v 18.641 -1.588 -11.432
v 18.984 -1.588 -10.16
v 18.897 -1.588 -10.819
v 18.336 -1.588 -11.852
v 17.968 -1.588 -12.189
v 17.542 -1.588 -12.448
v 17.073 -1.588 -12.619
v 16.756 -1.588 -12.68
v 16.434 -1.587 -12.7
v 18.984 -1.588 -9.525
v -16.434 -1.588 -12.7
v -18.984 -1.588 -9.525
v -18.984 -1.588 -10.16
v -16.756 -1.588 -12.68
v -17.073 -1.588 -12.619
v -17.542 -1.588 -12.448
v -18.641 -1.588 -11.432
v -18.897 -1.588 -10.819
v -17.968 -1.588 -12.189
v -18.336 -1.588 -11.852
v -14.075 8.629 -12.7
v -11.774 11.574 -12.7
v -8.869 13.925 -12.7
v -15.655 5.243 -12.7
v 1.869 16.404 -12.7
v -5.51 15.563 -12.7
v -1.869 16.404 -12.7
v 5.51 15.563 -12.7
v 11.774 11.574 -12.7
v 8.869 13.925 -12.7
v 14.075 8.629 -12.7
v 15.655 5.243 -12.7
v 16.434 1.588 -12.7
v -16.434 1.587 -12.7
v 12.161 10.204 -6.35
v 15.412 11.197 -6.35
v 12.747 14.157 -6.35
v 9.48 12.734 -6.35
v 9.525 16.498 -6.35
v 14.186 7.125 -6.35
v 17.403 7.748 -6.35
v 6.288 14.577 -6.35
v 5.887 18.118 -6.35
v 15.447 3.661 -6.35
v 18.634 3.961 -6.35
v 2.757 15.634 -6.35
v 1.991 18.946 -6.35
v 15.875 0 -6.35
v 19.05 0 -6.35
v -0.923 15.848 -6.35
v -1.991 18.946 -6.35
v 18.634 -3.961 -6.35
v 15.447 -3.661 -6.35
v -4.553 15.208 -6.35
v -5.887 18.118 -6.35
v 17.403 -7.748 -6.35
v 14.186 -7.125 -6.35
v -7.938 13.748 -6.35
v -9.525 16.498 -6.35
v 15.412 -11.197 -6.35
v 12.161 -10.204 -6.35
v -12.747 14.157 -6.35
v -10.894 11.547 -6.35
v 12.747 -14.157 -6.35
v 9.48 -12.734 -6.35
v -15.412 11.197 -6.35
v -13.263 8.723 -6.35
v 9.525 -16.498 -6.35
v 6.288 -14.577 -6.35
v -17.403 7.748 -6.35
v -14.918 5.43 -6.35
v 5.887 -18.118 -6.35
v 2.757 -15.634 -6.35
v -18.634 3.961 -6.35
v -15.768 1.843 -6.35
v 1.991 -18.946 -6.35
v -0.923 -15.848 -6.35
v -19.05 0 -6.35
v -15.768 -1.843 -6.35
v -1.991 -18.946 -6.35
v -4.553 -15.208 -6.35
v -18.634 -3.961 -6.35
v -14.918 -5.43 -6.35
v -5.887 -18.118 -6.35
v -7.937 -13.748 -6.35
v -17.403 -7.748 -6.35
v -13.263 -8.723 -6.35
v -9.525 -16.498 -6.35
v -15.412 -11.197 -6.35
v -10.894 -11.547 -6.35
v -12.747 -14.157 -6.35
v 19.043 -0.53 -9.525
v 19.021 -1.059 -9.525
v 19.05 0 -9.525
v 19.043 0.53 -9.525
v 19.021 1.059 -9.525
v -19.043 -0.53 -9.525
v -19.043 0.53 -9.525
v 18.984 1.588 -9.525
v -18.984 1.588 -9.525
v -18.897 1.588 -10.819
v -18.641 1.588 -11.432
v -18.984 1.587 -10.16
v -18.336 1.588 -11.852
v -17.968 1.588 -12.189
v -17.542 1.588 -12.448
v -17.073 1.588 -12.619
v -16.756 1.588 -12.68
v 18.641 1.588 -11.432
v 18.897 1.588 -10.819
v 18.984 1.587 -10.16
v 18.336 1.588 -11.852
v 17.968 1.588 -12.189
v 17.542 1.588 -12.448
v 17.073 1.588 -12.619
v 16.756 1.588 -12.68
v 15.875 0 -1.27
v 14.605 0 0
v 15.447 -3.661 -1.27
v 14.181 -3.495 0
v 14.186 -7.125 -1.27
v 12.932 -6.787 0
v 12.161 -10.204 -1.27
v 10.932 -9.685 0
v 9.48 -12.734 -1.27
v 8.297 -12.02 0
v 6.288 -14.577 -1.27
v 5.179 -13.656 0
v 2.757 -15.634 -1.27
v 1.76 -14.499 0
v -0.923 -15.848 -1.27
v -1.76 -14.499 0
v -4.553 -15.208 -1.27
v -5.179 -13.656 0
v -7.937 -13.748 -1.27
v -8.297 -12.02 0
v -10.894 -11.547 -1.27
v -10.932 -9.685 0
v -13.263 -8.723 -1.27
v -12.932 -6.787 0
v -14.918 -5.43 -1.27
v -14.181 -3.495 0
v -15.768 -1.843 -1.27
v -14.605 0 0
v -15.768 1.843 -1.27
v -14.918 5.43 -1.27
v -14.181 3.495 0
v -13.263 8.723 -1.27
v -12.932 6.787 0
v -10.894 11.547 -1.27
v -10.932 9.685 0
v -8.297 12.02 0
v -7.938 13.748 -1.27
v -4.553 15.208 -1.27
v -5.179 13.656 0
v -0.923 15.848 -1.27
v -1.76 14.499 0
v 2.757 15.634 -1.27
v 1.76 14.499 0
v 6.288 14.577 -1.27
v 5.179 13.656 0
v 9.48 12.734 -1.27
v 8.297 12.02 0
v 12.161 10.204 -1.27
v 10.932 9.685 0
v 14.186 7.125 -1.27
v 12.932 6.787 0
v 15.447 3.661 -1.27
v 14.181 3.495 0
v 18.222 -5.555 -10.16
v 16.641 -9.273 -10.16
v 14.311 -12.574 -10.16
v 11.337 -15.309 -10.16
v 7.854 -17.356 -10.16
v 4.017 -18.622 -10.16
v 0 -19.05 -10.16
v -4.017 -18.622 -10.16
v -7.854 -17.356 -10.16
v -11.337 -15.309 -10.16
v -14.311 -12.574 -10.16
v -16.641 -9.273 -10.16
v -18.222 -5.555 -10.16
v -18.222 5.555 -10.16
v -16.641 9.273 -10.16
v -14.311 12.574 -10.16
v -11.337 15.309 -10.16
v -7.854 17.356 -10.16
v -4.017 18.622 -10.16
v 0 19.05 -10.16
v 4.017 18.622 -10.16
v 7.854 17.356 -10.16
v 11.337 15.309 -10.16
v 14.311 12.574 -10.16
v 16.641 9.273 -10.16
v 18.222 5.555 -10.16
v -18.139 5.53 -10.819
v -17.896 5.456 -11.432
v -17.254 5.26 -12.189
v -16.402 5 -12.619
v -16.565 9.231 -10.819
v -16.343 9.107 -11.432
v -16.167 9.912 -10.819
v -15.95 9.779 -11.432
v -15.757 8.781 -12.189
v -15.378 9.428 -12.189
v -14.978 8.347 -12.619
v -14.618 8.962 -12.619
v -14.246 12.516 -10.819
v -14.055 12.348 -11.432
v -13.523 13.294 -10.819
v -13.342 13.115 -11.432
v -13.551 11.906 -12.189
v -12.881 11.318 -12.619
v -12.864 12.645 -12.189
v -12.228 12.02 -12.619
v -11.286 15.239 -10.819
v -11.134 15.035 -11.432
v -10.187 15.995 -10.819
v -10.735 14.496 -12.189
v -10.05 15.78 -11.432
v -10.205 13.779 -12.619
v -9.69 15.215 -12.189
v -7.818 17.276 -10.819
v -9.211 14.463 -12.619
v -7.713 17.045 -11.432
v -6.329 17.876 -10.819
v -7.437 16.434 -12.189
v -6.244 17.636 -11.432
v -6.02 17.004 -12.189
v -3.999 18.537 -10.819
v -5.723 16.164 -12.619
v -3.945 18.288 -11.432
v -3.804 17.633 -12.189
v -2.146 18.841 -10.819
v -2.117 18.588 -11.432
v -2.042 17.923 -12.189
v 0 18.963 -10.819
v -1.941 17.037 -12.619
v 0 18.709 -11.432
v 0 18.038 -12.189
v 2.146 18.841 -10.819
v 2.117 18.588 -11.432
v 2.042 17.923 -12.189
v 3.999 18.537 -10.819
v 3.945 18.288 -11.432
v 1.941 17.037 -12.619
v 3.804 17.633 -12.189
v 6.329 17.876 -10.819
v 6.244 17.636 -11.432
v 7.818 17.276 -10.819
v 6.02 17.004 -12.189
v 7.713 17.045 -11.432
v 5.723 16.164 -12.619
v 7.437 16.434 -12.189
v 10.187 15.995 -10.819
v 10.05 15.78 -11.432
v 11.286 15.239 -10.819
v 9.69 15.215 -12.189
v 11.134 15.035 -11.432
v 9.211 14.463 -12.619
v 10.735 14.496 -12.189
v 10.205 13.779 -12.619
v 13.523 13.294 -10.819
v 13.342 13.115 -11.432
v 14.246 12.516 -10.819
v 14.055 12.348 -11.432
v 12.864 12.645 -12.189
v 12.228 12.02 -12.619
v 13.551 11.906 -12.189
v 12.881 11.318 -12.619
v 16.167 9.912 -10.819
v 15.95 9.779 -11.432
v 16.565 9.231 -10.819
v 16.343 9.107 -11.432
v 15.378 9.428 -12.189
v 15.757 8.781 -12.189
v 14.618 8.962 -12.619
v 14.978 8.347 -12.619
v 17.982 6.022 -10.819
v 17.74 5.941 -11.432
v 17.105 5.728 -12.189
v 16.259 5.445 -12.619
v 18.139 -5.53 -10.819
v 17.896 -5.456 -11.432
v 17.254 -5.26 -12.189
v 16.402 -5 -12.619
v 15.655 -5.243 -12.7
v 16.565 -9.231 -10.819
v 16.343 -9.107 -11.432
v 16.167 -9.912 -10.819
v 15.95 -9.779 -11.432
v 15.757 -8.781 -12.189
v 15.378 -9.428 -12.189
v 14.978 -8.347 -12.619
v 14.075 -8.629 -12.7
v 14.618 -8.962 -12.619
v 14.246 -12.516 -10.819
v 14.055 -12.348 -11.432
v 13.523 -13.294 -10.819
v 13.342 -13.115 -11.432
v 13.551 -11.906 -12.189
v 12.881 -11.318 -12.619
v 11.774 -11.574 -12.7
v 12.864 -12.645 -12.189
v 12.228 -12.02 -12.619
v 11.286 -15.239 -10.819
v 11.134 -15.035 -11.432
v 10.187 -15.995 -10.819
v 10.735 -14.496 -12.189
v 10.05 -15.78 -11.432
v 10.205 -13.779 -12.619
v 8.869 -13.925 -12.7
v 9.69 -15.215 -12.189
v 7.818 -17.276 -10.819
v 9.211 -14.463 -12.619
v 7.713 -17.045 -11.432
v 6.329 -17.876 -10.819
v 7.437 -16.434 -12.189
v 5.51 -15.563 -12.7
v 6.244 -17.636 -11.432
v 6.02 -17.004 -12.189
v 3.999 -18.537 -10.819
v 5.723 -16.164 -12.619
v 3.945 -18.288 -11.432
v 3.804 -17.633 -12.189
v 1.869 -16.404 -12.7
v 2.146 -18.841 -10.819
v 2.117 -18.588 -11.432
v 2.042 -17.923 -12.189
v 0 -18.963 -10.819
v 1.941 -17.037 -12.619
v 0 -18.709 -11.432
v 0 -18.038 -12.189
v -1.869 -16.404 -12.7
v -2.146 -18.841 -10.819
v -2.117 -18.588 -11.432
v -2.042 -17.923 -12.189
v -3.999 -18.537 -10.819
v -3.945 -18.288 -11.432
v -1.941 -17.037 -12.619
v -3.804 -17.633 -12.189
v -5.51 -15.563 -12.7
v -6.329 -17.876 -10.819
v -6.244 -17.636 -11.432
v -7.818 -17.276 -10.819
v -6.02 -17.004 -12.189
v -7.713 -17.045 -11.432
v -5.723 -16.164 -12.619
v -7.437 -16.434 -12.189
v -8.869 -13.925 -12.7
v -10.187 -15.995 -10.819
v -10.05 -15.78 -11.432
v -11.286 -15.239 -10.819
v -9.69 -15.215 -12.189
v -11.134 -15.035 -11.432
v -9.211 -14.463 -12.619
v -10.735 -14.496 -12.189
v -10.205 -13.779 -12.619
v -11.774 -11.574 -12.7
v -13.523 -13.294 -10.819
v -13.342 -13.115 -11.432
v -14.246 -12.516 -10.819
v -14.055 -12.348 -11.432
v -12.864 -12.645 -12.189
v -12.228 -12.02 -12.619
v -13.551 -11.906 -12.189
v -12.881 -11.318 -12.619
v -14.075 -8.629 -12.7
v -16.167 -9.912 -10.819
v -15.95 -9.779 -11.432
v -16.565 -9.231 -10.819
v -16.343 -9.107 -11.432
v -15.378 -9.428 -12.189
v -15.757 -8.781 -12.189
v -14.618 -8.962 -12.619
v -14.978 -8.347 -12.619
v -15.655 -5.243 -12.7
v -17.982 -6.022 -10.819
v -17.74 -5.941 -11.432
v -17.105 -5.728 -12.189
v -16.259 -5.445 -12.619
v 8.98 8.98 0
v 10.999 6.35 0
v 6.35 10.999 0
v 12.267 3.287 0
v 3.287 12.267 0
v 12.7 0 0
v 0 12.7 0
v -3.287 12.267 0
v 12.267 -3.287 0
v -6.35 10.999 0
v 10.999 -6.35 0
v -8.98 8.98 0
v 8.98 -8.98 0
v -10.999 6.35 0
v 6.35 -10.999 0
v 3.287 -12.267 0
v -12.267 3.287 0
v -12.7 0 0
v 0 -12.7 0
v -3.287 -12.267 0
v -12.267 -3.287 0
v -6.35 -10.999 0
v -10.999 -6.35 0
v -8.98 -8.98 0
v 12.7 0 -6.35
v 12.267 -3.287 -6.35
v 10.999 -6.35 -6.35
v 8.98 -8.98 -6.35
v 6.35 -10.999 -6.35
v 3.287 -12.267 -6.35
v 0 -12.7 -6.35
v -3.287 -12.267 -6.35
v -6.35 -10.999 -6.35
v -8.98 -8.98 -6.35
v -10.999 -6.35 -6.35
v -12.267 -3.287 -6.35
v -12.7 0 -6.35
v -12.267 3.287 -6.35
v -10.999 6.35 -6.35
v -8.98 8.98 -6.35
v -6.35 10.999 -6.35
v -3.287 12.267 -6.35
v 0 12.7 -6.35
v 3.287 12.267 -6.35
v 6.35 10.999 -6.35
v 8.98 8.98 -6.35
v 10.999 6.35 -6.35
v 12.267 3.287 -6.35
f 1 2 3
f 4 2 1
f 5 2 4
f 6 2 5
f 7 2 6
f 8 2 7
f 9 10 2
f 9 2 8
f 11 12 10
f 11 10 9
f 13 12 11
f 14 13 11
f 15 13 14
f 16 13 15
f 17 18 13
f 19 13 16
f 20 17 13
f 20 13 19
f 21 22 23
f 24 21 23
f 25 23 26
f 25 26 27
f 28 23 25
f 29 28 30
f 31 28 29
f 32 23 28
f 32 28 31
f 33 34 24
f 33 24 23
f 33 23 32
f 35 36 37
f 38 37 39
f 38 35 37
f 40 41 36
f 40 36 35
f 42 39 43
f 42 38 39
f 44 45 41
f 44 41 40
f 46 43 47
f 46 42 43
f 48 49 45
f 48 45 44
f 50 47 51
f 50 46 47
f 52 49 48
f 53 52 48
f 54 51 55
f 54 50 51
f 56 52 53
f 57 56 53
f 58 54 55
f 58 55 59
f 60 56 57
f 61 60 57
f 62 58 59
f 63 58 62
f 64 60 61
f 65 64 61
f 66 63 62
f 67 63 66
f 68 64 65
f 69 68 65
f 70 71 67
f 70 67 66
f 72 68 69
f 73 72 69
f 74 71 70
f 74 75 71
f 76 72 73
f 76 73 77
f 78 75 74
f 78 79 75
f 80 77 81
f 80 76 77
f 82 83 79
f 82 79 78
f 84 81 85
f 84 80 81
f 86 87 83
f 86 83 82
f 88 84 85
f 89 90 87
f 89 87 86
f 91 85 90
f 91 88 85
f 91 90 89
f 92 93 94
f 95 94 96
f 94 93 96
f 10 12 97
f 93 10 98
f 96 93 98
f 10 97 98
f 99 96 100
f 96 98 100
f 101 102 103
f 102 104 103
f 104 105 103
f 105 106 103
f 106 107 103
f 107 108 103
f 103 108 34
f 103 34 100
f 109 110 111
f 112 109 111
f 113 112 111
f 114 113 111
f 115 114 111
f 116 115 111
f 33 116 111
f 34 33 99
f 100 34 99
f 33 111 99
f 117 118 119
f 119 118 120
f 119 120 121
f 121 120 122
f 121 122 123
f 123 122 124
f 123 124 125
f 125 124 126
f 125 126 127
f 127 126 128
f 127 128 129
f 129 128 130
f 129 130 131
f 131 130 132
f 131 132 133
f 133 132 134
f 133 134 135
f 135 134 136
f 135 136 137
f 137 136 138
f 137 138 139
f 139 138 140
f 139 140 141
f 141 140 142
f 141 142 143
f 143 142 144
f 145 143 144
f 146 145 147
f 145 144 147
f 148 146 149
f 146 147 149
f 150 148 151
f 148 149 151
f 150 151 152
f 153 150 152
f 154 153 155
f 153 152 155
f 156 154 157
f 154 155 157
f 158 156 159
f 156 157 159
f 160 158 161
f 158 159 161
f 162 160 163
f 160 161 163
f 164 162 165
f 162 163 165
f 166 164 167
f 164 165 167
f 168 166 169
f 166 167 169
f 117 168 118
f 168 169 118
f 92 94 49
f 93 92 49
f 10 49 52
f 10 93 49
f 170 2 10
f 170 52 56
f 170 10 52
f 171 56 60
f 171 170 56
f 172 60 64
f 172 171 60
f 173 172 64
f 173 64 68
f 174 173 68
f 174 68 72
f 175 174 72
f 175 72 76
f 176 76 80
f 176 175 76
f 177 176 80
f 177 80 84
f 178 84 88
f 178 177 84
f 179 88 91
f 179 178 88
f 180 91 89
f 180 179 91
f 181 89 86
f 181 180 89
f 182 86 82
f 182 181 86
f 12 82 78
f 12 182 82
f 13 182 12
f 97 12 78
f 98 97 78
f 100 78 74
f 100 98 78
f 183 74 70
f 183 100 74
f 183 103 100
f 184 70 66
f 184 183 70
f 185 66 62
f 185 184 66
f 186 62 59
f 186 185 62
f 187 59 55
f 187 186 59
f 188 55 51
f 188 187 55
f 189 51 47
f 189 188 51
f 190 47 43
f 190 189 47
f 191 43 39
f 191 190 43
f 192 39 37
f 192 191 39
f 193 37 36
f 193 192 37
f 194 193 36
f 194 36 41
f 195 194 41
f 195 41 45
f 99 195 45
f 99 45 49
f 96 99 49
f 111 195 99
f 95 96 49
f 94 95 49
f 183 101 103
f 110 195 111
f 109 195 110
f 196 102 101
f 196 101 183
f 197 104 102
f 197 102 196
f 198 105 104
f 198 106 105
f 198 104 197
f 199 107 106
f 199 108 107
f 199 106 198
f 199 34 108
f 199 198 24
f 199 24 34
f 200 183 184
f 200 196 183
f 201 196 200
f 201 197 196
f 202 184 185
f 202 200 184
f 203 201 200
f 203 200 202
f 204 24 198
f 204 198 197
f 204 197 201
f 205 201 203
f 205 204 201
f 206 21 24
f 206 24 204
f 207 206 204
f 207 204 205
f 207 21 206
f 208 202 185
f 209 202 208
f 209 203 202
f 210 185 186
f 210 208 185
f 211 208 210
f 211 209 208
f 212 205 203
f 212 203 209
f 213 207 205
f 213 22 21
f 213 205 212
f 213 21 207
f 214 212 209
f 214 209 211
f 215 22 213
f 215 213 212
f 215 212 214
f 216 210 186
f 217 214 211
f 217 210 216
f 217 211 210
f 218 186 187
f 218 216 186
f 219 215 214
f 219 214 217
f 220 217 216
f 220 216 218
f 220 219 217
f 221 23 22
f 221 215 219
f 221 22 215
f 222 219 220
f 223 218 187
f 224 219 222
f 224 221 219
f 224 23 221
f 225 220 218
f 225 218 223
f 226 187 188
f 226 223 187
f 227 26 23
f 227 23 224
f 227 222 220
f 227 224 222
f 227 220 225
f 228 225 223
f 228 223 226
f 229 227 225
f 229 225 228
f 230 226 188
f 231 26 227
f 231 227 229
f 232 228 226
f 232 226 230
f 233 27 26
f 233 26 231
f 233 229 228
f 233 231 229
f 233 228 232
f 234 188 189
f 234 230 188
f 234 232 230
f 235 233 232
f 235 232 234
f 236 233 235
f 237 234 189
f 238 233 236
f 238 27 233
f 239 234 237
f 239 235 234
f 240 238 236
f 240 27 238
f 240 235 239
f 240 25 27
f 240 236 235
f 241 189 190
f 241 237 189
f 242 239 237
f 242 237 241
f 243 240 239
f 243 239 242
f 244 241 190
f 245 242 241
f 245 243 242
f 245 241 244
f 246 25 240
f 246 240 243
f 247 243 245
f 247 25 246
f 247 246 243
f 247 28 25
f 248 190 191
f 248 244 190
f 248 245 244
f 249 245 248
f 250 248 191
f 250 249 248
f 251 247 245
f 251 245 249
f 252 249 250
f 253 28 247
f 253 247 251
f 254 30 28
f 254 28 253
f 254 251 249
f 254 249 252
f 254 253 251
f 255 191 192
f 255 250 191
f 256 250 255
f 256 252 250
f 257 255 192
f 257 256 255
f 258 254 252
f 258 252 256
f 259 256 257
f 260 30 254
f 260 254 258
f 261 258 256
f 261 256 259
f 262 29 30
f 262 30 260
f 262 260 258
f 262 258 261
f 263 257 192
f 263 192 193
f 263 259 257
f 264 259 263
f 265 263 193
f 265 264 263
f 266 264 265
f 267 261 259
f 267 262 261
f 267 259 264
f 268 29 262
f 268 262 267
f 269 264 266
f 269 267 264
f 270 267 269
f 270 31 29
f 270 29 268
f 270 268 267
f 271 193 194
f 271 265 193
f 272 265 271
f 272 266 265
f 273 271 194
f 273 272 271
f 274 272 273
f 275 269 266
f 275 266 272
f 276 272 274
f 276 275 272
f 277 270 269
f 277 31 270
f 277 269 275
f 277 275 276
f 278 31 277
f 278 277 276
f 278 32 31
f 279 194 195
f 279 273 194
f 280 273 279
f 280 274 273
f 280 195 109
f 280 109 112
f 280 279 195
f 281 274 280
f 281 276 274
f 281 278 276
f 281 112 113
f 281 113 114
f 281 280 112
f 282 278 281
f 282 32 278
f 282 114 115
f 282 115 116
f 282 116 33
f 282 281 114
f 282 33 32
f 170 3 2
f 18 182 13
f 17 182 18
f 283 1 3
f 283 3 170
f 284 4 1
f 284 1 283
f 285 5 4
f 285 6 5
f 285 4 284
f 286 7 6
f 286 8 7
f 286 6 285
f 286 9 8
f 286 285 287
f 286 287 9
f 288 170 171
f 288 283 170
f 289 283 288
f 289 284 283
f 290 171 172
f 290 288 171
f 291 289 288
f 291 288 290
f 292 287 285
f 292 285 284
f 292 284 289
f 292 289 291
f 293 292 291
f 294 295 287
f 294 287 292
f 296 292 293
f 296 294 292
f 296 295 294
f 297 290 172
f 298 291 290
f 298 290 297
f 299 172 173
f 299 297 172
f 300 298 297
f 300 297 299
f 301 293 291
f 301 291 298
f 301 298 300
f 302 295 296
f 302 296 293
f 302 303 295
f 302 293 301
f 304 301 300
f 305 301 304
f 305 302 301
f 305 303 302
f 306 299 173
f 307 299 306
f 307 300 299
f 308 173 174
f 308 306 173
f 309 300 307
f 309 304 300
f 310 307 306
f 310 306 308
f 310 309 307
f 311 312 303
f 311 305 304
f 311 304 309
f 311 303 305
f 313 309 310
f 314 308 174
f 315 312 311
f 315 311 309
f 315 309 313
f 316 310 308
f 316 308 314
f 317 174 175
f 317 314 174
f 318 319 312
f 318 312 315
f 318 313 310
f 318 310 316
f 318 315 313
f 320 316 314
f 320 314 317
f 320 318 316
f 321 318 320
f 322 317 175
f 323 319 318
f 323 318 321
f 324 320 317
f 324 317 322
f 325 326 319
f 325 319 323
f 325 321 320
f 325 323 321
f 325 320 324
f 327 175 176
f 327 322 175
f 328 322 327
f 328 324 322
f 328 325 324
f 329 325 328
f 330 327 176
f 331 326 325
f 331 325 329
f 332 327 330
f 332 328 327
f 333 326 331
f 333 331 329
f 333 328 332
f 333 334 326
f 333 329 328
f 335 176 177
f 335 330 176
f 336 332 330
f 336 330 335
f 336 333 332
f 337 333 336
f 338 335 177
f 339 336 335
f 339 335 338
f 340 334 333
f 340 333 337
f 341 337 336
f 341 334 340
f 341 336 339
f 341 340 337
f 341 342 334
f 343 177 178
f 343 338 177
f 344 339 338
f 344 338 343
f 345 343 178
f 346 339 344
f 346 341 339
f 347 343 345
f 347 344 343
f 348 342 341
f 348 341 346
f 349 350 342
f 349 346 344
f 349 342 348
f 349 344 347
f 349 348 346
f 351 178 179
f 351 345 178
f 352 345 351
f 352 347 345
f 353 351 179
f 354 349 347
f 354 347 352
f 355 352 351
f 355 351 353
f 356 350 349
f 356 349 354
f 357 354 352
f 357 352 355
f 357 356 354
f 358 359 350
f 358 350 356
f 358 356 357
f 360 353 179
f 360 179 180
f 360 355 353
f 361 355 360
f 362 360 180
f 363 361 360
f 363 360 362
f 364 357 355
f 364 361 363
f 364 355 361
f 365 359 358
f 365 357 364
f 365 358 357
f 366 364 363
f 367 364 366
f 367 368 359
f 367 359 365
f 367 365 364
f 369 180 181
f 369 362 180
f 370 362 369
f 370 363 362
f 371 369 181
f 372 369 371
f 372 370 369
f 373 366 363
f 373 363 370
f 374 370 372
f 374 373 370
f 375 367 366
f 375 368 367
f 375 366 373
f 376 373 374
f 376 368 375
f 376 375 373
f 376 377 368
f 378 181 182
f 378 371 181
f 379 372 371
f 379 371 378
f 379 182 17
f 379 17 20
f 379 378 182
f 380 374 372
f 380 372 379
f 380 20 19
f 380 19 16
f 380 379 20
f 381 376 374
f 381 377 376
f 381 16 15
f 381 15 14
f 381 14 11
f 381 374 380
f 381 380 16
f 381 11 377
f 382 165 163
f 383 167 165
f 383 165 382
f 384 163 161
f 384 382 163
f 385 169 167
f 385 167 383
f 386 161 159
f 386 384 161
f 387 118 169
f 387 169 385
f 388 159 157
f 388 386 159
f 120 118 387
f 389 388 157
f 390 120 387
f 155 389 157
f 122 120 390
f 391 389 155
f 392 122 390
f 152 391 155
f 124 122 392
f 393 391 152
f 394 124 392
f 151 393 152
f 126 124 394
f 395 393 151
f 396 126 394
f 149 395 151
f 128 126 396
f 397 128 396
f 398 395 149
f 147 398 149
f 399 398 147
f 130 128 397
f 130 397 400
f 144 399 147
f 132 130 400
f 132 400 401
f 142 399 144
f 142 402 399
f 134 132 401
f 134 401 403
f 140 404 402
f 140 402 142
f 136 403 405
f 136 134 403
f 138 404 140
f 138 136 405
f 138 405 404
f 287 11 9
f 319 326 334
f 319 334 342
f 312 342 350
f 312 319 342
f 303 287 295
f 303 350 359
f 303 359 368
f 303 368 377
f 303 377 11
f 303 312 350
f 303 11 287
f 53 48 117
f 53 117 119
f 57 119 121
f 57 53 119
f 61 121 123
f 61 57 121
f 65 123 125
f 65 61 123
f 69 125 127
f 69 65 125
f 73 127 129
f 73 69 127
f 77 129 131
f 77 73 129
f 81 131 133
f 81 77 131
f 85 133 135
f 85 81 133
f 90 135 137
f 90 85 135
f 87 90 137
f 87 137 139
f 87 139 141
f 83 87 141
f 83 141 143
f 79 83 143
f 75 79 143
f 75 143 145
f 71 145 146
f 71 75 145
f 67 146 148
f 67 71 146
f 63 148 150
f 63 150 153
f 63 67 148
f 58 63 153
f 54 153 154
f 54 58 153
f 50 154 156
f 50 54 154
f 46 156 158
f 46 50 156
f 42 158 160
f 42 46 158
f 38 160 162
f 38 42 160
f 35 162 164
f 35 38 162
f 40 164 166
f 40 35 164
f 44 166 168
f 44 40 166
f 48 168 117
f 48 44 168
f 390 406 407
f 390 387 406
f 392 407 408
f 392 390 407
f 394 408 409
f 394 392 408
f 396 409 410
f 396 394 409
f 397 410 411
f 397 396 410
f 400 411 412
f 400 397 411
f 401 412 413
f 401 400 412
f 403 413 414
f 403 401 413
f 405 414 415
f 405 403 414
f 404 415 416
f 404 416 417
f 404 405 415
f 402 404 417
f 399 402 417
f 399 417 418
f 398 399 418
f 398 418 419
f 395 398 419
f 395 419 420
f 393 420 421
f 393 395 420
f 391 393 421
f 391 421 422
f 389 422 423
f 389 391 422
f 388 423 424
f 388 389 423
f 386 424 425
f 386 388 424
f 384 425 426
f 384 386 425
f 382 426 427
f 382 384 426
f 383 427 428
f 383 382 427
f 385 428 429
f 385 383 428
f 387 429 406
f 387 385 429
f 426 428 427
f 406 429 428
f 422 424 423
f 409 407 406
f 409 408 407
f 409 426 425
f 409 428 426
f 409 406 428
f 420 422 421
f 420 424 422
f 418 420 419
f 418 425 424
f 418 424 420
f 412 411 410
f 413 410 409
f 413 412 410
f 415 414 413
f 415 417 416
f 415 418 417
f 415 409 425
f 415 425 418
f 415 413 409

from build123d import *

# Parameters (mm, degrees)
CUT_EXTRUDE1_DEPTH      = 20.05
CUT_EXTRUDE1_DEPTH_BACK = 20.05
FILLET1_R               = 2.54
CHAMFER1_SIZE           = 1.27


with BuildPart() as part:
    # Sketch1 → Revolve1 (revolve)
    with BuildSketch(Plane(origin=(0, 0, 0), x_dir=(1, 0, 0), z_dir=(0, 1, 0))):
        Polygon((12.7, 0), (15.875, 0), (15.875, 6.35), (19.05, 6.35), (19.05, 12.7), (0, 12.7), (0, 6.35), (12.7, 6.35), align=None)
    revolve(axis=Axis((0, 0, 31.989022308), (0, 0, -1)))

    # Sketch2 → Cut-Extrude1 (cut, two sides)
    with BuildSketch(Plane(origin=(0, 0, 0), x_dir=(0, 0, -1), z_dir=(1, 0, 0))) as cut_extrude1_sk:
        Polygon((71.164271634, -1.5875), (12.7, -1.5875), (9.525, -1.5875), (9.525, 1.5875), (12.7, 1.5875), (71.164271634, 1.5875), (188.092814902, 1.5875), (188.092814902, -1.5875), align=None)
    extrude(amount=CUT_EXTRUDE1_DEPTH, mode=Mode.SUBTRACT)
    extrude(cut_extrude1_sk.sketch, amount=-CUT_EXTRUDE1_DEPTH_BACK, mode=Mode.SUBTRACT)

    # Fillet1
    fillet1_edges = [part.edges().sort_by_distance(p)[0] for p in [
        (0, -19.05, -12.7),
        (0, 19.05, -12.7),
    ]]
    fillet(fillet1_edges, radius=FILLET1_R)

    # Chamfer1
    chamfer1_edges = [part.edges().sort_by_distance(p)[0] for p in [
        (-15.875, 0, 0),
    ]]
    chamfer(chamfer1_edges, length=CHAMFER1_SIZE)


solid = part.part
